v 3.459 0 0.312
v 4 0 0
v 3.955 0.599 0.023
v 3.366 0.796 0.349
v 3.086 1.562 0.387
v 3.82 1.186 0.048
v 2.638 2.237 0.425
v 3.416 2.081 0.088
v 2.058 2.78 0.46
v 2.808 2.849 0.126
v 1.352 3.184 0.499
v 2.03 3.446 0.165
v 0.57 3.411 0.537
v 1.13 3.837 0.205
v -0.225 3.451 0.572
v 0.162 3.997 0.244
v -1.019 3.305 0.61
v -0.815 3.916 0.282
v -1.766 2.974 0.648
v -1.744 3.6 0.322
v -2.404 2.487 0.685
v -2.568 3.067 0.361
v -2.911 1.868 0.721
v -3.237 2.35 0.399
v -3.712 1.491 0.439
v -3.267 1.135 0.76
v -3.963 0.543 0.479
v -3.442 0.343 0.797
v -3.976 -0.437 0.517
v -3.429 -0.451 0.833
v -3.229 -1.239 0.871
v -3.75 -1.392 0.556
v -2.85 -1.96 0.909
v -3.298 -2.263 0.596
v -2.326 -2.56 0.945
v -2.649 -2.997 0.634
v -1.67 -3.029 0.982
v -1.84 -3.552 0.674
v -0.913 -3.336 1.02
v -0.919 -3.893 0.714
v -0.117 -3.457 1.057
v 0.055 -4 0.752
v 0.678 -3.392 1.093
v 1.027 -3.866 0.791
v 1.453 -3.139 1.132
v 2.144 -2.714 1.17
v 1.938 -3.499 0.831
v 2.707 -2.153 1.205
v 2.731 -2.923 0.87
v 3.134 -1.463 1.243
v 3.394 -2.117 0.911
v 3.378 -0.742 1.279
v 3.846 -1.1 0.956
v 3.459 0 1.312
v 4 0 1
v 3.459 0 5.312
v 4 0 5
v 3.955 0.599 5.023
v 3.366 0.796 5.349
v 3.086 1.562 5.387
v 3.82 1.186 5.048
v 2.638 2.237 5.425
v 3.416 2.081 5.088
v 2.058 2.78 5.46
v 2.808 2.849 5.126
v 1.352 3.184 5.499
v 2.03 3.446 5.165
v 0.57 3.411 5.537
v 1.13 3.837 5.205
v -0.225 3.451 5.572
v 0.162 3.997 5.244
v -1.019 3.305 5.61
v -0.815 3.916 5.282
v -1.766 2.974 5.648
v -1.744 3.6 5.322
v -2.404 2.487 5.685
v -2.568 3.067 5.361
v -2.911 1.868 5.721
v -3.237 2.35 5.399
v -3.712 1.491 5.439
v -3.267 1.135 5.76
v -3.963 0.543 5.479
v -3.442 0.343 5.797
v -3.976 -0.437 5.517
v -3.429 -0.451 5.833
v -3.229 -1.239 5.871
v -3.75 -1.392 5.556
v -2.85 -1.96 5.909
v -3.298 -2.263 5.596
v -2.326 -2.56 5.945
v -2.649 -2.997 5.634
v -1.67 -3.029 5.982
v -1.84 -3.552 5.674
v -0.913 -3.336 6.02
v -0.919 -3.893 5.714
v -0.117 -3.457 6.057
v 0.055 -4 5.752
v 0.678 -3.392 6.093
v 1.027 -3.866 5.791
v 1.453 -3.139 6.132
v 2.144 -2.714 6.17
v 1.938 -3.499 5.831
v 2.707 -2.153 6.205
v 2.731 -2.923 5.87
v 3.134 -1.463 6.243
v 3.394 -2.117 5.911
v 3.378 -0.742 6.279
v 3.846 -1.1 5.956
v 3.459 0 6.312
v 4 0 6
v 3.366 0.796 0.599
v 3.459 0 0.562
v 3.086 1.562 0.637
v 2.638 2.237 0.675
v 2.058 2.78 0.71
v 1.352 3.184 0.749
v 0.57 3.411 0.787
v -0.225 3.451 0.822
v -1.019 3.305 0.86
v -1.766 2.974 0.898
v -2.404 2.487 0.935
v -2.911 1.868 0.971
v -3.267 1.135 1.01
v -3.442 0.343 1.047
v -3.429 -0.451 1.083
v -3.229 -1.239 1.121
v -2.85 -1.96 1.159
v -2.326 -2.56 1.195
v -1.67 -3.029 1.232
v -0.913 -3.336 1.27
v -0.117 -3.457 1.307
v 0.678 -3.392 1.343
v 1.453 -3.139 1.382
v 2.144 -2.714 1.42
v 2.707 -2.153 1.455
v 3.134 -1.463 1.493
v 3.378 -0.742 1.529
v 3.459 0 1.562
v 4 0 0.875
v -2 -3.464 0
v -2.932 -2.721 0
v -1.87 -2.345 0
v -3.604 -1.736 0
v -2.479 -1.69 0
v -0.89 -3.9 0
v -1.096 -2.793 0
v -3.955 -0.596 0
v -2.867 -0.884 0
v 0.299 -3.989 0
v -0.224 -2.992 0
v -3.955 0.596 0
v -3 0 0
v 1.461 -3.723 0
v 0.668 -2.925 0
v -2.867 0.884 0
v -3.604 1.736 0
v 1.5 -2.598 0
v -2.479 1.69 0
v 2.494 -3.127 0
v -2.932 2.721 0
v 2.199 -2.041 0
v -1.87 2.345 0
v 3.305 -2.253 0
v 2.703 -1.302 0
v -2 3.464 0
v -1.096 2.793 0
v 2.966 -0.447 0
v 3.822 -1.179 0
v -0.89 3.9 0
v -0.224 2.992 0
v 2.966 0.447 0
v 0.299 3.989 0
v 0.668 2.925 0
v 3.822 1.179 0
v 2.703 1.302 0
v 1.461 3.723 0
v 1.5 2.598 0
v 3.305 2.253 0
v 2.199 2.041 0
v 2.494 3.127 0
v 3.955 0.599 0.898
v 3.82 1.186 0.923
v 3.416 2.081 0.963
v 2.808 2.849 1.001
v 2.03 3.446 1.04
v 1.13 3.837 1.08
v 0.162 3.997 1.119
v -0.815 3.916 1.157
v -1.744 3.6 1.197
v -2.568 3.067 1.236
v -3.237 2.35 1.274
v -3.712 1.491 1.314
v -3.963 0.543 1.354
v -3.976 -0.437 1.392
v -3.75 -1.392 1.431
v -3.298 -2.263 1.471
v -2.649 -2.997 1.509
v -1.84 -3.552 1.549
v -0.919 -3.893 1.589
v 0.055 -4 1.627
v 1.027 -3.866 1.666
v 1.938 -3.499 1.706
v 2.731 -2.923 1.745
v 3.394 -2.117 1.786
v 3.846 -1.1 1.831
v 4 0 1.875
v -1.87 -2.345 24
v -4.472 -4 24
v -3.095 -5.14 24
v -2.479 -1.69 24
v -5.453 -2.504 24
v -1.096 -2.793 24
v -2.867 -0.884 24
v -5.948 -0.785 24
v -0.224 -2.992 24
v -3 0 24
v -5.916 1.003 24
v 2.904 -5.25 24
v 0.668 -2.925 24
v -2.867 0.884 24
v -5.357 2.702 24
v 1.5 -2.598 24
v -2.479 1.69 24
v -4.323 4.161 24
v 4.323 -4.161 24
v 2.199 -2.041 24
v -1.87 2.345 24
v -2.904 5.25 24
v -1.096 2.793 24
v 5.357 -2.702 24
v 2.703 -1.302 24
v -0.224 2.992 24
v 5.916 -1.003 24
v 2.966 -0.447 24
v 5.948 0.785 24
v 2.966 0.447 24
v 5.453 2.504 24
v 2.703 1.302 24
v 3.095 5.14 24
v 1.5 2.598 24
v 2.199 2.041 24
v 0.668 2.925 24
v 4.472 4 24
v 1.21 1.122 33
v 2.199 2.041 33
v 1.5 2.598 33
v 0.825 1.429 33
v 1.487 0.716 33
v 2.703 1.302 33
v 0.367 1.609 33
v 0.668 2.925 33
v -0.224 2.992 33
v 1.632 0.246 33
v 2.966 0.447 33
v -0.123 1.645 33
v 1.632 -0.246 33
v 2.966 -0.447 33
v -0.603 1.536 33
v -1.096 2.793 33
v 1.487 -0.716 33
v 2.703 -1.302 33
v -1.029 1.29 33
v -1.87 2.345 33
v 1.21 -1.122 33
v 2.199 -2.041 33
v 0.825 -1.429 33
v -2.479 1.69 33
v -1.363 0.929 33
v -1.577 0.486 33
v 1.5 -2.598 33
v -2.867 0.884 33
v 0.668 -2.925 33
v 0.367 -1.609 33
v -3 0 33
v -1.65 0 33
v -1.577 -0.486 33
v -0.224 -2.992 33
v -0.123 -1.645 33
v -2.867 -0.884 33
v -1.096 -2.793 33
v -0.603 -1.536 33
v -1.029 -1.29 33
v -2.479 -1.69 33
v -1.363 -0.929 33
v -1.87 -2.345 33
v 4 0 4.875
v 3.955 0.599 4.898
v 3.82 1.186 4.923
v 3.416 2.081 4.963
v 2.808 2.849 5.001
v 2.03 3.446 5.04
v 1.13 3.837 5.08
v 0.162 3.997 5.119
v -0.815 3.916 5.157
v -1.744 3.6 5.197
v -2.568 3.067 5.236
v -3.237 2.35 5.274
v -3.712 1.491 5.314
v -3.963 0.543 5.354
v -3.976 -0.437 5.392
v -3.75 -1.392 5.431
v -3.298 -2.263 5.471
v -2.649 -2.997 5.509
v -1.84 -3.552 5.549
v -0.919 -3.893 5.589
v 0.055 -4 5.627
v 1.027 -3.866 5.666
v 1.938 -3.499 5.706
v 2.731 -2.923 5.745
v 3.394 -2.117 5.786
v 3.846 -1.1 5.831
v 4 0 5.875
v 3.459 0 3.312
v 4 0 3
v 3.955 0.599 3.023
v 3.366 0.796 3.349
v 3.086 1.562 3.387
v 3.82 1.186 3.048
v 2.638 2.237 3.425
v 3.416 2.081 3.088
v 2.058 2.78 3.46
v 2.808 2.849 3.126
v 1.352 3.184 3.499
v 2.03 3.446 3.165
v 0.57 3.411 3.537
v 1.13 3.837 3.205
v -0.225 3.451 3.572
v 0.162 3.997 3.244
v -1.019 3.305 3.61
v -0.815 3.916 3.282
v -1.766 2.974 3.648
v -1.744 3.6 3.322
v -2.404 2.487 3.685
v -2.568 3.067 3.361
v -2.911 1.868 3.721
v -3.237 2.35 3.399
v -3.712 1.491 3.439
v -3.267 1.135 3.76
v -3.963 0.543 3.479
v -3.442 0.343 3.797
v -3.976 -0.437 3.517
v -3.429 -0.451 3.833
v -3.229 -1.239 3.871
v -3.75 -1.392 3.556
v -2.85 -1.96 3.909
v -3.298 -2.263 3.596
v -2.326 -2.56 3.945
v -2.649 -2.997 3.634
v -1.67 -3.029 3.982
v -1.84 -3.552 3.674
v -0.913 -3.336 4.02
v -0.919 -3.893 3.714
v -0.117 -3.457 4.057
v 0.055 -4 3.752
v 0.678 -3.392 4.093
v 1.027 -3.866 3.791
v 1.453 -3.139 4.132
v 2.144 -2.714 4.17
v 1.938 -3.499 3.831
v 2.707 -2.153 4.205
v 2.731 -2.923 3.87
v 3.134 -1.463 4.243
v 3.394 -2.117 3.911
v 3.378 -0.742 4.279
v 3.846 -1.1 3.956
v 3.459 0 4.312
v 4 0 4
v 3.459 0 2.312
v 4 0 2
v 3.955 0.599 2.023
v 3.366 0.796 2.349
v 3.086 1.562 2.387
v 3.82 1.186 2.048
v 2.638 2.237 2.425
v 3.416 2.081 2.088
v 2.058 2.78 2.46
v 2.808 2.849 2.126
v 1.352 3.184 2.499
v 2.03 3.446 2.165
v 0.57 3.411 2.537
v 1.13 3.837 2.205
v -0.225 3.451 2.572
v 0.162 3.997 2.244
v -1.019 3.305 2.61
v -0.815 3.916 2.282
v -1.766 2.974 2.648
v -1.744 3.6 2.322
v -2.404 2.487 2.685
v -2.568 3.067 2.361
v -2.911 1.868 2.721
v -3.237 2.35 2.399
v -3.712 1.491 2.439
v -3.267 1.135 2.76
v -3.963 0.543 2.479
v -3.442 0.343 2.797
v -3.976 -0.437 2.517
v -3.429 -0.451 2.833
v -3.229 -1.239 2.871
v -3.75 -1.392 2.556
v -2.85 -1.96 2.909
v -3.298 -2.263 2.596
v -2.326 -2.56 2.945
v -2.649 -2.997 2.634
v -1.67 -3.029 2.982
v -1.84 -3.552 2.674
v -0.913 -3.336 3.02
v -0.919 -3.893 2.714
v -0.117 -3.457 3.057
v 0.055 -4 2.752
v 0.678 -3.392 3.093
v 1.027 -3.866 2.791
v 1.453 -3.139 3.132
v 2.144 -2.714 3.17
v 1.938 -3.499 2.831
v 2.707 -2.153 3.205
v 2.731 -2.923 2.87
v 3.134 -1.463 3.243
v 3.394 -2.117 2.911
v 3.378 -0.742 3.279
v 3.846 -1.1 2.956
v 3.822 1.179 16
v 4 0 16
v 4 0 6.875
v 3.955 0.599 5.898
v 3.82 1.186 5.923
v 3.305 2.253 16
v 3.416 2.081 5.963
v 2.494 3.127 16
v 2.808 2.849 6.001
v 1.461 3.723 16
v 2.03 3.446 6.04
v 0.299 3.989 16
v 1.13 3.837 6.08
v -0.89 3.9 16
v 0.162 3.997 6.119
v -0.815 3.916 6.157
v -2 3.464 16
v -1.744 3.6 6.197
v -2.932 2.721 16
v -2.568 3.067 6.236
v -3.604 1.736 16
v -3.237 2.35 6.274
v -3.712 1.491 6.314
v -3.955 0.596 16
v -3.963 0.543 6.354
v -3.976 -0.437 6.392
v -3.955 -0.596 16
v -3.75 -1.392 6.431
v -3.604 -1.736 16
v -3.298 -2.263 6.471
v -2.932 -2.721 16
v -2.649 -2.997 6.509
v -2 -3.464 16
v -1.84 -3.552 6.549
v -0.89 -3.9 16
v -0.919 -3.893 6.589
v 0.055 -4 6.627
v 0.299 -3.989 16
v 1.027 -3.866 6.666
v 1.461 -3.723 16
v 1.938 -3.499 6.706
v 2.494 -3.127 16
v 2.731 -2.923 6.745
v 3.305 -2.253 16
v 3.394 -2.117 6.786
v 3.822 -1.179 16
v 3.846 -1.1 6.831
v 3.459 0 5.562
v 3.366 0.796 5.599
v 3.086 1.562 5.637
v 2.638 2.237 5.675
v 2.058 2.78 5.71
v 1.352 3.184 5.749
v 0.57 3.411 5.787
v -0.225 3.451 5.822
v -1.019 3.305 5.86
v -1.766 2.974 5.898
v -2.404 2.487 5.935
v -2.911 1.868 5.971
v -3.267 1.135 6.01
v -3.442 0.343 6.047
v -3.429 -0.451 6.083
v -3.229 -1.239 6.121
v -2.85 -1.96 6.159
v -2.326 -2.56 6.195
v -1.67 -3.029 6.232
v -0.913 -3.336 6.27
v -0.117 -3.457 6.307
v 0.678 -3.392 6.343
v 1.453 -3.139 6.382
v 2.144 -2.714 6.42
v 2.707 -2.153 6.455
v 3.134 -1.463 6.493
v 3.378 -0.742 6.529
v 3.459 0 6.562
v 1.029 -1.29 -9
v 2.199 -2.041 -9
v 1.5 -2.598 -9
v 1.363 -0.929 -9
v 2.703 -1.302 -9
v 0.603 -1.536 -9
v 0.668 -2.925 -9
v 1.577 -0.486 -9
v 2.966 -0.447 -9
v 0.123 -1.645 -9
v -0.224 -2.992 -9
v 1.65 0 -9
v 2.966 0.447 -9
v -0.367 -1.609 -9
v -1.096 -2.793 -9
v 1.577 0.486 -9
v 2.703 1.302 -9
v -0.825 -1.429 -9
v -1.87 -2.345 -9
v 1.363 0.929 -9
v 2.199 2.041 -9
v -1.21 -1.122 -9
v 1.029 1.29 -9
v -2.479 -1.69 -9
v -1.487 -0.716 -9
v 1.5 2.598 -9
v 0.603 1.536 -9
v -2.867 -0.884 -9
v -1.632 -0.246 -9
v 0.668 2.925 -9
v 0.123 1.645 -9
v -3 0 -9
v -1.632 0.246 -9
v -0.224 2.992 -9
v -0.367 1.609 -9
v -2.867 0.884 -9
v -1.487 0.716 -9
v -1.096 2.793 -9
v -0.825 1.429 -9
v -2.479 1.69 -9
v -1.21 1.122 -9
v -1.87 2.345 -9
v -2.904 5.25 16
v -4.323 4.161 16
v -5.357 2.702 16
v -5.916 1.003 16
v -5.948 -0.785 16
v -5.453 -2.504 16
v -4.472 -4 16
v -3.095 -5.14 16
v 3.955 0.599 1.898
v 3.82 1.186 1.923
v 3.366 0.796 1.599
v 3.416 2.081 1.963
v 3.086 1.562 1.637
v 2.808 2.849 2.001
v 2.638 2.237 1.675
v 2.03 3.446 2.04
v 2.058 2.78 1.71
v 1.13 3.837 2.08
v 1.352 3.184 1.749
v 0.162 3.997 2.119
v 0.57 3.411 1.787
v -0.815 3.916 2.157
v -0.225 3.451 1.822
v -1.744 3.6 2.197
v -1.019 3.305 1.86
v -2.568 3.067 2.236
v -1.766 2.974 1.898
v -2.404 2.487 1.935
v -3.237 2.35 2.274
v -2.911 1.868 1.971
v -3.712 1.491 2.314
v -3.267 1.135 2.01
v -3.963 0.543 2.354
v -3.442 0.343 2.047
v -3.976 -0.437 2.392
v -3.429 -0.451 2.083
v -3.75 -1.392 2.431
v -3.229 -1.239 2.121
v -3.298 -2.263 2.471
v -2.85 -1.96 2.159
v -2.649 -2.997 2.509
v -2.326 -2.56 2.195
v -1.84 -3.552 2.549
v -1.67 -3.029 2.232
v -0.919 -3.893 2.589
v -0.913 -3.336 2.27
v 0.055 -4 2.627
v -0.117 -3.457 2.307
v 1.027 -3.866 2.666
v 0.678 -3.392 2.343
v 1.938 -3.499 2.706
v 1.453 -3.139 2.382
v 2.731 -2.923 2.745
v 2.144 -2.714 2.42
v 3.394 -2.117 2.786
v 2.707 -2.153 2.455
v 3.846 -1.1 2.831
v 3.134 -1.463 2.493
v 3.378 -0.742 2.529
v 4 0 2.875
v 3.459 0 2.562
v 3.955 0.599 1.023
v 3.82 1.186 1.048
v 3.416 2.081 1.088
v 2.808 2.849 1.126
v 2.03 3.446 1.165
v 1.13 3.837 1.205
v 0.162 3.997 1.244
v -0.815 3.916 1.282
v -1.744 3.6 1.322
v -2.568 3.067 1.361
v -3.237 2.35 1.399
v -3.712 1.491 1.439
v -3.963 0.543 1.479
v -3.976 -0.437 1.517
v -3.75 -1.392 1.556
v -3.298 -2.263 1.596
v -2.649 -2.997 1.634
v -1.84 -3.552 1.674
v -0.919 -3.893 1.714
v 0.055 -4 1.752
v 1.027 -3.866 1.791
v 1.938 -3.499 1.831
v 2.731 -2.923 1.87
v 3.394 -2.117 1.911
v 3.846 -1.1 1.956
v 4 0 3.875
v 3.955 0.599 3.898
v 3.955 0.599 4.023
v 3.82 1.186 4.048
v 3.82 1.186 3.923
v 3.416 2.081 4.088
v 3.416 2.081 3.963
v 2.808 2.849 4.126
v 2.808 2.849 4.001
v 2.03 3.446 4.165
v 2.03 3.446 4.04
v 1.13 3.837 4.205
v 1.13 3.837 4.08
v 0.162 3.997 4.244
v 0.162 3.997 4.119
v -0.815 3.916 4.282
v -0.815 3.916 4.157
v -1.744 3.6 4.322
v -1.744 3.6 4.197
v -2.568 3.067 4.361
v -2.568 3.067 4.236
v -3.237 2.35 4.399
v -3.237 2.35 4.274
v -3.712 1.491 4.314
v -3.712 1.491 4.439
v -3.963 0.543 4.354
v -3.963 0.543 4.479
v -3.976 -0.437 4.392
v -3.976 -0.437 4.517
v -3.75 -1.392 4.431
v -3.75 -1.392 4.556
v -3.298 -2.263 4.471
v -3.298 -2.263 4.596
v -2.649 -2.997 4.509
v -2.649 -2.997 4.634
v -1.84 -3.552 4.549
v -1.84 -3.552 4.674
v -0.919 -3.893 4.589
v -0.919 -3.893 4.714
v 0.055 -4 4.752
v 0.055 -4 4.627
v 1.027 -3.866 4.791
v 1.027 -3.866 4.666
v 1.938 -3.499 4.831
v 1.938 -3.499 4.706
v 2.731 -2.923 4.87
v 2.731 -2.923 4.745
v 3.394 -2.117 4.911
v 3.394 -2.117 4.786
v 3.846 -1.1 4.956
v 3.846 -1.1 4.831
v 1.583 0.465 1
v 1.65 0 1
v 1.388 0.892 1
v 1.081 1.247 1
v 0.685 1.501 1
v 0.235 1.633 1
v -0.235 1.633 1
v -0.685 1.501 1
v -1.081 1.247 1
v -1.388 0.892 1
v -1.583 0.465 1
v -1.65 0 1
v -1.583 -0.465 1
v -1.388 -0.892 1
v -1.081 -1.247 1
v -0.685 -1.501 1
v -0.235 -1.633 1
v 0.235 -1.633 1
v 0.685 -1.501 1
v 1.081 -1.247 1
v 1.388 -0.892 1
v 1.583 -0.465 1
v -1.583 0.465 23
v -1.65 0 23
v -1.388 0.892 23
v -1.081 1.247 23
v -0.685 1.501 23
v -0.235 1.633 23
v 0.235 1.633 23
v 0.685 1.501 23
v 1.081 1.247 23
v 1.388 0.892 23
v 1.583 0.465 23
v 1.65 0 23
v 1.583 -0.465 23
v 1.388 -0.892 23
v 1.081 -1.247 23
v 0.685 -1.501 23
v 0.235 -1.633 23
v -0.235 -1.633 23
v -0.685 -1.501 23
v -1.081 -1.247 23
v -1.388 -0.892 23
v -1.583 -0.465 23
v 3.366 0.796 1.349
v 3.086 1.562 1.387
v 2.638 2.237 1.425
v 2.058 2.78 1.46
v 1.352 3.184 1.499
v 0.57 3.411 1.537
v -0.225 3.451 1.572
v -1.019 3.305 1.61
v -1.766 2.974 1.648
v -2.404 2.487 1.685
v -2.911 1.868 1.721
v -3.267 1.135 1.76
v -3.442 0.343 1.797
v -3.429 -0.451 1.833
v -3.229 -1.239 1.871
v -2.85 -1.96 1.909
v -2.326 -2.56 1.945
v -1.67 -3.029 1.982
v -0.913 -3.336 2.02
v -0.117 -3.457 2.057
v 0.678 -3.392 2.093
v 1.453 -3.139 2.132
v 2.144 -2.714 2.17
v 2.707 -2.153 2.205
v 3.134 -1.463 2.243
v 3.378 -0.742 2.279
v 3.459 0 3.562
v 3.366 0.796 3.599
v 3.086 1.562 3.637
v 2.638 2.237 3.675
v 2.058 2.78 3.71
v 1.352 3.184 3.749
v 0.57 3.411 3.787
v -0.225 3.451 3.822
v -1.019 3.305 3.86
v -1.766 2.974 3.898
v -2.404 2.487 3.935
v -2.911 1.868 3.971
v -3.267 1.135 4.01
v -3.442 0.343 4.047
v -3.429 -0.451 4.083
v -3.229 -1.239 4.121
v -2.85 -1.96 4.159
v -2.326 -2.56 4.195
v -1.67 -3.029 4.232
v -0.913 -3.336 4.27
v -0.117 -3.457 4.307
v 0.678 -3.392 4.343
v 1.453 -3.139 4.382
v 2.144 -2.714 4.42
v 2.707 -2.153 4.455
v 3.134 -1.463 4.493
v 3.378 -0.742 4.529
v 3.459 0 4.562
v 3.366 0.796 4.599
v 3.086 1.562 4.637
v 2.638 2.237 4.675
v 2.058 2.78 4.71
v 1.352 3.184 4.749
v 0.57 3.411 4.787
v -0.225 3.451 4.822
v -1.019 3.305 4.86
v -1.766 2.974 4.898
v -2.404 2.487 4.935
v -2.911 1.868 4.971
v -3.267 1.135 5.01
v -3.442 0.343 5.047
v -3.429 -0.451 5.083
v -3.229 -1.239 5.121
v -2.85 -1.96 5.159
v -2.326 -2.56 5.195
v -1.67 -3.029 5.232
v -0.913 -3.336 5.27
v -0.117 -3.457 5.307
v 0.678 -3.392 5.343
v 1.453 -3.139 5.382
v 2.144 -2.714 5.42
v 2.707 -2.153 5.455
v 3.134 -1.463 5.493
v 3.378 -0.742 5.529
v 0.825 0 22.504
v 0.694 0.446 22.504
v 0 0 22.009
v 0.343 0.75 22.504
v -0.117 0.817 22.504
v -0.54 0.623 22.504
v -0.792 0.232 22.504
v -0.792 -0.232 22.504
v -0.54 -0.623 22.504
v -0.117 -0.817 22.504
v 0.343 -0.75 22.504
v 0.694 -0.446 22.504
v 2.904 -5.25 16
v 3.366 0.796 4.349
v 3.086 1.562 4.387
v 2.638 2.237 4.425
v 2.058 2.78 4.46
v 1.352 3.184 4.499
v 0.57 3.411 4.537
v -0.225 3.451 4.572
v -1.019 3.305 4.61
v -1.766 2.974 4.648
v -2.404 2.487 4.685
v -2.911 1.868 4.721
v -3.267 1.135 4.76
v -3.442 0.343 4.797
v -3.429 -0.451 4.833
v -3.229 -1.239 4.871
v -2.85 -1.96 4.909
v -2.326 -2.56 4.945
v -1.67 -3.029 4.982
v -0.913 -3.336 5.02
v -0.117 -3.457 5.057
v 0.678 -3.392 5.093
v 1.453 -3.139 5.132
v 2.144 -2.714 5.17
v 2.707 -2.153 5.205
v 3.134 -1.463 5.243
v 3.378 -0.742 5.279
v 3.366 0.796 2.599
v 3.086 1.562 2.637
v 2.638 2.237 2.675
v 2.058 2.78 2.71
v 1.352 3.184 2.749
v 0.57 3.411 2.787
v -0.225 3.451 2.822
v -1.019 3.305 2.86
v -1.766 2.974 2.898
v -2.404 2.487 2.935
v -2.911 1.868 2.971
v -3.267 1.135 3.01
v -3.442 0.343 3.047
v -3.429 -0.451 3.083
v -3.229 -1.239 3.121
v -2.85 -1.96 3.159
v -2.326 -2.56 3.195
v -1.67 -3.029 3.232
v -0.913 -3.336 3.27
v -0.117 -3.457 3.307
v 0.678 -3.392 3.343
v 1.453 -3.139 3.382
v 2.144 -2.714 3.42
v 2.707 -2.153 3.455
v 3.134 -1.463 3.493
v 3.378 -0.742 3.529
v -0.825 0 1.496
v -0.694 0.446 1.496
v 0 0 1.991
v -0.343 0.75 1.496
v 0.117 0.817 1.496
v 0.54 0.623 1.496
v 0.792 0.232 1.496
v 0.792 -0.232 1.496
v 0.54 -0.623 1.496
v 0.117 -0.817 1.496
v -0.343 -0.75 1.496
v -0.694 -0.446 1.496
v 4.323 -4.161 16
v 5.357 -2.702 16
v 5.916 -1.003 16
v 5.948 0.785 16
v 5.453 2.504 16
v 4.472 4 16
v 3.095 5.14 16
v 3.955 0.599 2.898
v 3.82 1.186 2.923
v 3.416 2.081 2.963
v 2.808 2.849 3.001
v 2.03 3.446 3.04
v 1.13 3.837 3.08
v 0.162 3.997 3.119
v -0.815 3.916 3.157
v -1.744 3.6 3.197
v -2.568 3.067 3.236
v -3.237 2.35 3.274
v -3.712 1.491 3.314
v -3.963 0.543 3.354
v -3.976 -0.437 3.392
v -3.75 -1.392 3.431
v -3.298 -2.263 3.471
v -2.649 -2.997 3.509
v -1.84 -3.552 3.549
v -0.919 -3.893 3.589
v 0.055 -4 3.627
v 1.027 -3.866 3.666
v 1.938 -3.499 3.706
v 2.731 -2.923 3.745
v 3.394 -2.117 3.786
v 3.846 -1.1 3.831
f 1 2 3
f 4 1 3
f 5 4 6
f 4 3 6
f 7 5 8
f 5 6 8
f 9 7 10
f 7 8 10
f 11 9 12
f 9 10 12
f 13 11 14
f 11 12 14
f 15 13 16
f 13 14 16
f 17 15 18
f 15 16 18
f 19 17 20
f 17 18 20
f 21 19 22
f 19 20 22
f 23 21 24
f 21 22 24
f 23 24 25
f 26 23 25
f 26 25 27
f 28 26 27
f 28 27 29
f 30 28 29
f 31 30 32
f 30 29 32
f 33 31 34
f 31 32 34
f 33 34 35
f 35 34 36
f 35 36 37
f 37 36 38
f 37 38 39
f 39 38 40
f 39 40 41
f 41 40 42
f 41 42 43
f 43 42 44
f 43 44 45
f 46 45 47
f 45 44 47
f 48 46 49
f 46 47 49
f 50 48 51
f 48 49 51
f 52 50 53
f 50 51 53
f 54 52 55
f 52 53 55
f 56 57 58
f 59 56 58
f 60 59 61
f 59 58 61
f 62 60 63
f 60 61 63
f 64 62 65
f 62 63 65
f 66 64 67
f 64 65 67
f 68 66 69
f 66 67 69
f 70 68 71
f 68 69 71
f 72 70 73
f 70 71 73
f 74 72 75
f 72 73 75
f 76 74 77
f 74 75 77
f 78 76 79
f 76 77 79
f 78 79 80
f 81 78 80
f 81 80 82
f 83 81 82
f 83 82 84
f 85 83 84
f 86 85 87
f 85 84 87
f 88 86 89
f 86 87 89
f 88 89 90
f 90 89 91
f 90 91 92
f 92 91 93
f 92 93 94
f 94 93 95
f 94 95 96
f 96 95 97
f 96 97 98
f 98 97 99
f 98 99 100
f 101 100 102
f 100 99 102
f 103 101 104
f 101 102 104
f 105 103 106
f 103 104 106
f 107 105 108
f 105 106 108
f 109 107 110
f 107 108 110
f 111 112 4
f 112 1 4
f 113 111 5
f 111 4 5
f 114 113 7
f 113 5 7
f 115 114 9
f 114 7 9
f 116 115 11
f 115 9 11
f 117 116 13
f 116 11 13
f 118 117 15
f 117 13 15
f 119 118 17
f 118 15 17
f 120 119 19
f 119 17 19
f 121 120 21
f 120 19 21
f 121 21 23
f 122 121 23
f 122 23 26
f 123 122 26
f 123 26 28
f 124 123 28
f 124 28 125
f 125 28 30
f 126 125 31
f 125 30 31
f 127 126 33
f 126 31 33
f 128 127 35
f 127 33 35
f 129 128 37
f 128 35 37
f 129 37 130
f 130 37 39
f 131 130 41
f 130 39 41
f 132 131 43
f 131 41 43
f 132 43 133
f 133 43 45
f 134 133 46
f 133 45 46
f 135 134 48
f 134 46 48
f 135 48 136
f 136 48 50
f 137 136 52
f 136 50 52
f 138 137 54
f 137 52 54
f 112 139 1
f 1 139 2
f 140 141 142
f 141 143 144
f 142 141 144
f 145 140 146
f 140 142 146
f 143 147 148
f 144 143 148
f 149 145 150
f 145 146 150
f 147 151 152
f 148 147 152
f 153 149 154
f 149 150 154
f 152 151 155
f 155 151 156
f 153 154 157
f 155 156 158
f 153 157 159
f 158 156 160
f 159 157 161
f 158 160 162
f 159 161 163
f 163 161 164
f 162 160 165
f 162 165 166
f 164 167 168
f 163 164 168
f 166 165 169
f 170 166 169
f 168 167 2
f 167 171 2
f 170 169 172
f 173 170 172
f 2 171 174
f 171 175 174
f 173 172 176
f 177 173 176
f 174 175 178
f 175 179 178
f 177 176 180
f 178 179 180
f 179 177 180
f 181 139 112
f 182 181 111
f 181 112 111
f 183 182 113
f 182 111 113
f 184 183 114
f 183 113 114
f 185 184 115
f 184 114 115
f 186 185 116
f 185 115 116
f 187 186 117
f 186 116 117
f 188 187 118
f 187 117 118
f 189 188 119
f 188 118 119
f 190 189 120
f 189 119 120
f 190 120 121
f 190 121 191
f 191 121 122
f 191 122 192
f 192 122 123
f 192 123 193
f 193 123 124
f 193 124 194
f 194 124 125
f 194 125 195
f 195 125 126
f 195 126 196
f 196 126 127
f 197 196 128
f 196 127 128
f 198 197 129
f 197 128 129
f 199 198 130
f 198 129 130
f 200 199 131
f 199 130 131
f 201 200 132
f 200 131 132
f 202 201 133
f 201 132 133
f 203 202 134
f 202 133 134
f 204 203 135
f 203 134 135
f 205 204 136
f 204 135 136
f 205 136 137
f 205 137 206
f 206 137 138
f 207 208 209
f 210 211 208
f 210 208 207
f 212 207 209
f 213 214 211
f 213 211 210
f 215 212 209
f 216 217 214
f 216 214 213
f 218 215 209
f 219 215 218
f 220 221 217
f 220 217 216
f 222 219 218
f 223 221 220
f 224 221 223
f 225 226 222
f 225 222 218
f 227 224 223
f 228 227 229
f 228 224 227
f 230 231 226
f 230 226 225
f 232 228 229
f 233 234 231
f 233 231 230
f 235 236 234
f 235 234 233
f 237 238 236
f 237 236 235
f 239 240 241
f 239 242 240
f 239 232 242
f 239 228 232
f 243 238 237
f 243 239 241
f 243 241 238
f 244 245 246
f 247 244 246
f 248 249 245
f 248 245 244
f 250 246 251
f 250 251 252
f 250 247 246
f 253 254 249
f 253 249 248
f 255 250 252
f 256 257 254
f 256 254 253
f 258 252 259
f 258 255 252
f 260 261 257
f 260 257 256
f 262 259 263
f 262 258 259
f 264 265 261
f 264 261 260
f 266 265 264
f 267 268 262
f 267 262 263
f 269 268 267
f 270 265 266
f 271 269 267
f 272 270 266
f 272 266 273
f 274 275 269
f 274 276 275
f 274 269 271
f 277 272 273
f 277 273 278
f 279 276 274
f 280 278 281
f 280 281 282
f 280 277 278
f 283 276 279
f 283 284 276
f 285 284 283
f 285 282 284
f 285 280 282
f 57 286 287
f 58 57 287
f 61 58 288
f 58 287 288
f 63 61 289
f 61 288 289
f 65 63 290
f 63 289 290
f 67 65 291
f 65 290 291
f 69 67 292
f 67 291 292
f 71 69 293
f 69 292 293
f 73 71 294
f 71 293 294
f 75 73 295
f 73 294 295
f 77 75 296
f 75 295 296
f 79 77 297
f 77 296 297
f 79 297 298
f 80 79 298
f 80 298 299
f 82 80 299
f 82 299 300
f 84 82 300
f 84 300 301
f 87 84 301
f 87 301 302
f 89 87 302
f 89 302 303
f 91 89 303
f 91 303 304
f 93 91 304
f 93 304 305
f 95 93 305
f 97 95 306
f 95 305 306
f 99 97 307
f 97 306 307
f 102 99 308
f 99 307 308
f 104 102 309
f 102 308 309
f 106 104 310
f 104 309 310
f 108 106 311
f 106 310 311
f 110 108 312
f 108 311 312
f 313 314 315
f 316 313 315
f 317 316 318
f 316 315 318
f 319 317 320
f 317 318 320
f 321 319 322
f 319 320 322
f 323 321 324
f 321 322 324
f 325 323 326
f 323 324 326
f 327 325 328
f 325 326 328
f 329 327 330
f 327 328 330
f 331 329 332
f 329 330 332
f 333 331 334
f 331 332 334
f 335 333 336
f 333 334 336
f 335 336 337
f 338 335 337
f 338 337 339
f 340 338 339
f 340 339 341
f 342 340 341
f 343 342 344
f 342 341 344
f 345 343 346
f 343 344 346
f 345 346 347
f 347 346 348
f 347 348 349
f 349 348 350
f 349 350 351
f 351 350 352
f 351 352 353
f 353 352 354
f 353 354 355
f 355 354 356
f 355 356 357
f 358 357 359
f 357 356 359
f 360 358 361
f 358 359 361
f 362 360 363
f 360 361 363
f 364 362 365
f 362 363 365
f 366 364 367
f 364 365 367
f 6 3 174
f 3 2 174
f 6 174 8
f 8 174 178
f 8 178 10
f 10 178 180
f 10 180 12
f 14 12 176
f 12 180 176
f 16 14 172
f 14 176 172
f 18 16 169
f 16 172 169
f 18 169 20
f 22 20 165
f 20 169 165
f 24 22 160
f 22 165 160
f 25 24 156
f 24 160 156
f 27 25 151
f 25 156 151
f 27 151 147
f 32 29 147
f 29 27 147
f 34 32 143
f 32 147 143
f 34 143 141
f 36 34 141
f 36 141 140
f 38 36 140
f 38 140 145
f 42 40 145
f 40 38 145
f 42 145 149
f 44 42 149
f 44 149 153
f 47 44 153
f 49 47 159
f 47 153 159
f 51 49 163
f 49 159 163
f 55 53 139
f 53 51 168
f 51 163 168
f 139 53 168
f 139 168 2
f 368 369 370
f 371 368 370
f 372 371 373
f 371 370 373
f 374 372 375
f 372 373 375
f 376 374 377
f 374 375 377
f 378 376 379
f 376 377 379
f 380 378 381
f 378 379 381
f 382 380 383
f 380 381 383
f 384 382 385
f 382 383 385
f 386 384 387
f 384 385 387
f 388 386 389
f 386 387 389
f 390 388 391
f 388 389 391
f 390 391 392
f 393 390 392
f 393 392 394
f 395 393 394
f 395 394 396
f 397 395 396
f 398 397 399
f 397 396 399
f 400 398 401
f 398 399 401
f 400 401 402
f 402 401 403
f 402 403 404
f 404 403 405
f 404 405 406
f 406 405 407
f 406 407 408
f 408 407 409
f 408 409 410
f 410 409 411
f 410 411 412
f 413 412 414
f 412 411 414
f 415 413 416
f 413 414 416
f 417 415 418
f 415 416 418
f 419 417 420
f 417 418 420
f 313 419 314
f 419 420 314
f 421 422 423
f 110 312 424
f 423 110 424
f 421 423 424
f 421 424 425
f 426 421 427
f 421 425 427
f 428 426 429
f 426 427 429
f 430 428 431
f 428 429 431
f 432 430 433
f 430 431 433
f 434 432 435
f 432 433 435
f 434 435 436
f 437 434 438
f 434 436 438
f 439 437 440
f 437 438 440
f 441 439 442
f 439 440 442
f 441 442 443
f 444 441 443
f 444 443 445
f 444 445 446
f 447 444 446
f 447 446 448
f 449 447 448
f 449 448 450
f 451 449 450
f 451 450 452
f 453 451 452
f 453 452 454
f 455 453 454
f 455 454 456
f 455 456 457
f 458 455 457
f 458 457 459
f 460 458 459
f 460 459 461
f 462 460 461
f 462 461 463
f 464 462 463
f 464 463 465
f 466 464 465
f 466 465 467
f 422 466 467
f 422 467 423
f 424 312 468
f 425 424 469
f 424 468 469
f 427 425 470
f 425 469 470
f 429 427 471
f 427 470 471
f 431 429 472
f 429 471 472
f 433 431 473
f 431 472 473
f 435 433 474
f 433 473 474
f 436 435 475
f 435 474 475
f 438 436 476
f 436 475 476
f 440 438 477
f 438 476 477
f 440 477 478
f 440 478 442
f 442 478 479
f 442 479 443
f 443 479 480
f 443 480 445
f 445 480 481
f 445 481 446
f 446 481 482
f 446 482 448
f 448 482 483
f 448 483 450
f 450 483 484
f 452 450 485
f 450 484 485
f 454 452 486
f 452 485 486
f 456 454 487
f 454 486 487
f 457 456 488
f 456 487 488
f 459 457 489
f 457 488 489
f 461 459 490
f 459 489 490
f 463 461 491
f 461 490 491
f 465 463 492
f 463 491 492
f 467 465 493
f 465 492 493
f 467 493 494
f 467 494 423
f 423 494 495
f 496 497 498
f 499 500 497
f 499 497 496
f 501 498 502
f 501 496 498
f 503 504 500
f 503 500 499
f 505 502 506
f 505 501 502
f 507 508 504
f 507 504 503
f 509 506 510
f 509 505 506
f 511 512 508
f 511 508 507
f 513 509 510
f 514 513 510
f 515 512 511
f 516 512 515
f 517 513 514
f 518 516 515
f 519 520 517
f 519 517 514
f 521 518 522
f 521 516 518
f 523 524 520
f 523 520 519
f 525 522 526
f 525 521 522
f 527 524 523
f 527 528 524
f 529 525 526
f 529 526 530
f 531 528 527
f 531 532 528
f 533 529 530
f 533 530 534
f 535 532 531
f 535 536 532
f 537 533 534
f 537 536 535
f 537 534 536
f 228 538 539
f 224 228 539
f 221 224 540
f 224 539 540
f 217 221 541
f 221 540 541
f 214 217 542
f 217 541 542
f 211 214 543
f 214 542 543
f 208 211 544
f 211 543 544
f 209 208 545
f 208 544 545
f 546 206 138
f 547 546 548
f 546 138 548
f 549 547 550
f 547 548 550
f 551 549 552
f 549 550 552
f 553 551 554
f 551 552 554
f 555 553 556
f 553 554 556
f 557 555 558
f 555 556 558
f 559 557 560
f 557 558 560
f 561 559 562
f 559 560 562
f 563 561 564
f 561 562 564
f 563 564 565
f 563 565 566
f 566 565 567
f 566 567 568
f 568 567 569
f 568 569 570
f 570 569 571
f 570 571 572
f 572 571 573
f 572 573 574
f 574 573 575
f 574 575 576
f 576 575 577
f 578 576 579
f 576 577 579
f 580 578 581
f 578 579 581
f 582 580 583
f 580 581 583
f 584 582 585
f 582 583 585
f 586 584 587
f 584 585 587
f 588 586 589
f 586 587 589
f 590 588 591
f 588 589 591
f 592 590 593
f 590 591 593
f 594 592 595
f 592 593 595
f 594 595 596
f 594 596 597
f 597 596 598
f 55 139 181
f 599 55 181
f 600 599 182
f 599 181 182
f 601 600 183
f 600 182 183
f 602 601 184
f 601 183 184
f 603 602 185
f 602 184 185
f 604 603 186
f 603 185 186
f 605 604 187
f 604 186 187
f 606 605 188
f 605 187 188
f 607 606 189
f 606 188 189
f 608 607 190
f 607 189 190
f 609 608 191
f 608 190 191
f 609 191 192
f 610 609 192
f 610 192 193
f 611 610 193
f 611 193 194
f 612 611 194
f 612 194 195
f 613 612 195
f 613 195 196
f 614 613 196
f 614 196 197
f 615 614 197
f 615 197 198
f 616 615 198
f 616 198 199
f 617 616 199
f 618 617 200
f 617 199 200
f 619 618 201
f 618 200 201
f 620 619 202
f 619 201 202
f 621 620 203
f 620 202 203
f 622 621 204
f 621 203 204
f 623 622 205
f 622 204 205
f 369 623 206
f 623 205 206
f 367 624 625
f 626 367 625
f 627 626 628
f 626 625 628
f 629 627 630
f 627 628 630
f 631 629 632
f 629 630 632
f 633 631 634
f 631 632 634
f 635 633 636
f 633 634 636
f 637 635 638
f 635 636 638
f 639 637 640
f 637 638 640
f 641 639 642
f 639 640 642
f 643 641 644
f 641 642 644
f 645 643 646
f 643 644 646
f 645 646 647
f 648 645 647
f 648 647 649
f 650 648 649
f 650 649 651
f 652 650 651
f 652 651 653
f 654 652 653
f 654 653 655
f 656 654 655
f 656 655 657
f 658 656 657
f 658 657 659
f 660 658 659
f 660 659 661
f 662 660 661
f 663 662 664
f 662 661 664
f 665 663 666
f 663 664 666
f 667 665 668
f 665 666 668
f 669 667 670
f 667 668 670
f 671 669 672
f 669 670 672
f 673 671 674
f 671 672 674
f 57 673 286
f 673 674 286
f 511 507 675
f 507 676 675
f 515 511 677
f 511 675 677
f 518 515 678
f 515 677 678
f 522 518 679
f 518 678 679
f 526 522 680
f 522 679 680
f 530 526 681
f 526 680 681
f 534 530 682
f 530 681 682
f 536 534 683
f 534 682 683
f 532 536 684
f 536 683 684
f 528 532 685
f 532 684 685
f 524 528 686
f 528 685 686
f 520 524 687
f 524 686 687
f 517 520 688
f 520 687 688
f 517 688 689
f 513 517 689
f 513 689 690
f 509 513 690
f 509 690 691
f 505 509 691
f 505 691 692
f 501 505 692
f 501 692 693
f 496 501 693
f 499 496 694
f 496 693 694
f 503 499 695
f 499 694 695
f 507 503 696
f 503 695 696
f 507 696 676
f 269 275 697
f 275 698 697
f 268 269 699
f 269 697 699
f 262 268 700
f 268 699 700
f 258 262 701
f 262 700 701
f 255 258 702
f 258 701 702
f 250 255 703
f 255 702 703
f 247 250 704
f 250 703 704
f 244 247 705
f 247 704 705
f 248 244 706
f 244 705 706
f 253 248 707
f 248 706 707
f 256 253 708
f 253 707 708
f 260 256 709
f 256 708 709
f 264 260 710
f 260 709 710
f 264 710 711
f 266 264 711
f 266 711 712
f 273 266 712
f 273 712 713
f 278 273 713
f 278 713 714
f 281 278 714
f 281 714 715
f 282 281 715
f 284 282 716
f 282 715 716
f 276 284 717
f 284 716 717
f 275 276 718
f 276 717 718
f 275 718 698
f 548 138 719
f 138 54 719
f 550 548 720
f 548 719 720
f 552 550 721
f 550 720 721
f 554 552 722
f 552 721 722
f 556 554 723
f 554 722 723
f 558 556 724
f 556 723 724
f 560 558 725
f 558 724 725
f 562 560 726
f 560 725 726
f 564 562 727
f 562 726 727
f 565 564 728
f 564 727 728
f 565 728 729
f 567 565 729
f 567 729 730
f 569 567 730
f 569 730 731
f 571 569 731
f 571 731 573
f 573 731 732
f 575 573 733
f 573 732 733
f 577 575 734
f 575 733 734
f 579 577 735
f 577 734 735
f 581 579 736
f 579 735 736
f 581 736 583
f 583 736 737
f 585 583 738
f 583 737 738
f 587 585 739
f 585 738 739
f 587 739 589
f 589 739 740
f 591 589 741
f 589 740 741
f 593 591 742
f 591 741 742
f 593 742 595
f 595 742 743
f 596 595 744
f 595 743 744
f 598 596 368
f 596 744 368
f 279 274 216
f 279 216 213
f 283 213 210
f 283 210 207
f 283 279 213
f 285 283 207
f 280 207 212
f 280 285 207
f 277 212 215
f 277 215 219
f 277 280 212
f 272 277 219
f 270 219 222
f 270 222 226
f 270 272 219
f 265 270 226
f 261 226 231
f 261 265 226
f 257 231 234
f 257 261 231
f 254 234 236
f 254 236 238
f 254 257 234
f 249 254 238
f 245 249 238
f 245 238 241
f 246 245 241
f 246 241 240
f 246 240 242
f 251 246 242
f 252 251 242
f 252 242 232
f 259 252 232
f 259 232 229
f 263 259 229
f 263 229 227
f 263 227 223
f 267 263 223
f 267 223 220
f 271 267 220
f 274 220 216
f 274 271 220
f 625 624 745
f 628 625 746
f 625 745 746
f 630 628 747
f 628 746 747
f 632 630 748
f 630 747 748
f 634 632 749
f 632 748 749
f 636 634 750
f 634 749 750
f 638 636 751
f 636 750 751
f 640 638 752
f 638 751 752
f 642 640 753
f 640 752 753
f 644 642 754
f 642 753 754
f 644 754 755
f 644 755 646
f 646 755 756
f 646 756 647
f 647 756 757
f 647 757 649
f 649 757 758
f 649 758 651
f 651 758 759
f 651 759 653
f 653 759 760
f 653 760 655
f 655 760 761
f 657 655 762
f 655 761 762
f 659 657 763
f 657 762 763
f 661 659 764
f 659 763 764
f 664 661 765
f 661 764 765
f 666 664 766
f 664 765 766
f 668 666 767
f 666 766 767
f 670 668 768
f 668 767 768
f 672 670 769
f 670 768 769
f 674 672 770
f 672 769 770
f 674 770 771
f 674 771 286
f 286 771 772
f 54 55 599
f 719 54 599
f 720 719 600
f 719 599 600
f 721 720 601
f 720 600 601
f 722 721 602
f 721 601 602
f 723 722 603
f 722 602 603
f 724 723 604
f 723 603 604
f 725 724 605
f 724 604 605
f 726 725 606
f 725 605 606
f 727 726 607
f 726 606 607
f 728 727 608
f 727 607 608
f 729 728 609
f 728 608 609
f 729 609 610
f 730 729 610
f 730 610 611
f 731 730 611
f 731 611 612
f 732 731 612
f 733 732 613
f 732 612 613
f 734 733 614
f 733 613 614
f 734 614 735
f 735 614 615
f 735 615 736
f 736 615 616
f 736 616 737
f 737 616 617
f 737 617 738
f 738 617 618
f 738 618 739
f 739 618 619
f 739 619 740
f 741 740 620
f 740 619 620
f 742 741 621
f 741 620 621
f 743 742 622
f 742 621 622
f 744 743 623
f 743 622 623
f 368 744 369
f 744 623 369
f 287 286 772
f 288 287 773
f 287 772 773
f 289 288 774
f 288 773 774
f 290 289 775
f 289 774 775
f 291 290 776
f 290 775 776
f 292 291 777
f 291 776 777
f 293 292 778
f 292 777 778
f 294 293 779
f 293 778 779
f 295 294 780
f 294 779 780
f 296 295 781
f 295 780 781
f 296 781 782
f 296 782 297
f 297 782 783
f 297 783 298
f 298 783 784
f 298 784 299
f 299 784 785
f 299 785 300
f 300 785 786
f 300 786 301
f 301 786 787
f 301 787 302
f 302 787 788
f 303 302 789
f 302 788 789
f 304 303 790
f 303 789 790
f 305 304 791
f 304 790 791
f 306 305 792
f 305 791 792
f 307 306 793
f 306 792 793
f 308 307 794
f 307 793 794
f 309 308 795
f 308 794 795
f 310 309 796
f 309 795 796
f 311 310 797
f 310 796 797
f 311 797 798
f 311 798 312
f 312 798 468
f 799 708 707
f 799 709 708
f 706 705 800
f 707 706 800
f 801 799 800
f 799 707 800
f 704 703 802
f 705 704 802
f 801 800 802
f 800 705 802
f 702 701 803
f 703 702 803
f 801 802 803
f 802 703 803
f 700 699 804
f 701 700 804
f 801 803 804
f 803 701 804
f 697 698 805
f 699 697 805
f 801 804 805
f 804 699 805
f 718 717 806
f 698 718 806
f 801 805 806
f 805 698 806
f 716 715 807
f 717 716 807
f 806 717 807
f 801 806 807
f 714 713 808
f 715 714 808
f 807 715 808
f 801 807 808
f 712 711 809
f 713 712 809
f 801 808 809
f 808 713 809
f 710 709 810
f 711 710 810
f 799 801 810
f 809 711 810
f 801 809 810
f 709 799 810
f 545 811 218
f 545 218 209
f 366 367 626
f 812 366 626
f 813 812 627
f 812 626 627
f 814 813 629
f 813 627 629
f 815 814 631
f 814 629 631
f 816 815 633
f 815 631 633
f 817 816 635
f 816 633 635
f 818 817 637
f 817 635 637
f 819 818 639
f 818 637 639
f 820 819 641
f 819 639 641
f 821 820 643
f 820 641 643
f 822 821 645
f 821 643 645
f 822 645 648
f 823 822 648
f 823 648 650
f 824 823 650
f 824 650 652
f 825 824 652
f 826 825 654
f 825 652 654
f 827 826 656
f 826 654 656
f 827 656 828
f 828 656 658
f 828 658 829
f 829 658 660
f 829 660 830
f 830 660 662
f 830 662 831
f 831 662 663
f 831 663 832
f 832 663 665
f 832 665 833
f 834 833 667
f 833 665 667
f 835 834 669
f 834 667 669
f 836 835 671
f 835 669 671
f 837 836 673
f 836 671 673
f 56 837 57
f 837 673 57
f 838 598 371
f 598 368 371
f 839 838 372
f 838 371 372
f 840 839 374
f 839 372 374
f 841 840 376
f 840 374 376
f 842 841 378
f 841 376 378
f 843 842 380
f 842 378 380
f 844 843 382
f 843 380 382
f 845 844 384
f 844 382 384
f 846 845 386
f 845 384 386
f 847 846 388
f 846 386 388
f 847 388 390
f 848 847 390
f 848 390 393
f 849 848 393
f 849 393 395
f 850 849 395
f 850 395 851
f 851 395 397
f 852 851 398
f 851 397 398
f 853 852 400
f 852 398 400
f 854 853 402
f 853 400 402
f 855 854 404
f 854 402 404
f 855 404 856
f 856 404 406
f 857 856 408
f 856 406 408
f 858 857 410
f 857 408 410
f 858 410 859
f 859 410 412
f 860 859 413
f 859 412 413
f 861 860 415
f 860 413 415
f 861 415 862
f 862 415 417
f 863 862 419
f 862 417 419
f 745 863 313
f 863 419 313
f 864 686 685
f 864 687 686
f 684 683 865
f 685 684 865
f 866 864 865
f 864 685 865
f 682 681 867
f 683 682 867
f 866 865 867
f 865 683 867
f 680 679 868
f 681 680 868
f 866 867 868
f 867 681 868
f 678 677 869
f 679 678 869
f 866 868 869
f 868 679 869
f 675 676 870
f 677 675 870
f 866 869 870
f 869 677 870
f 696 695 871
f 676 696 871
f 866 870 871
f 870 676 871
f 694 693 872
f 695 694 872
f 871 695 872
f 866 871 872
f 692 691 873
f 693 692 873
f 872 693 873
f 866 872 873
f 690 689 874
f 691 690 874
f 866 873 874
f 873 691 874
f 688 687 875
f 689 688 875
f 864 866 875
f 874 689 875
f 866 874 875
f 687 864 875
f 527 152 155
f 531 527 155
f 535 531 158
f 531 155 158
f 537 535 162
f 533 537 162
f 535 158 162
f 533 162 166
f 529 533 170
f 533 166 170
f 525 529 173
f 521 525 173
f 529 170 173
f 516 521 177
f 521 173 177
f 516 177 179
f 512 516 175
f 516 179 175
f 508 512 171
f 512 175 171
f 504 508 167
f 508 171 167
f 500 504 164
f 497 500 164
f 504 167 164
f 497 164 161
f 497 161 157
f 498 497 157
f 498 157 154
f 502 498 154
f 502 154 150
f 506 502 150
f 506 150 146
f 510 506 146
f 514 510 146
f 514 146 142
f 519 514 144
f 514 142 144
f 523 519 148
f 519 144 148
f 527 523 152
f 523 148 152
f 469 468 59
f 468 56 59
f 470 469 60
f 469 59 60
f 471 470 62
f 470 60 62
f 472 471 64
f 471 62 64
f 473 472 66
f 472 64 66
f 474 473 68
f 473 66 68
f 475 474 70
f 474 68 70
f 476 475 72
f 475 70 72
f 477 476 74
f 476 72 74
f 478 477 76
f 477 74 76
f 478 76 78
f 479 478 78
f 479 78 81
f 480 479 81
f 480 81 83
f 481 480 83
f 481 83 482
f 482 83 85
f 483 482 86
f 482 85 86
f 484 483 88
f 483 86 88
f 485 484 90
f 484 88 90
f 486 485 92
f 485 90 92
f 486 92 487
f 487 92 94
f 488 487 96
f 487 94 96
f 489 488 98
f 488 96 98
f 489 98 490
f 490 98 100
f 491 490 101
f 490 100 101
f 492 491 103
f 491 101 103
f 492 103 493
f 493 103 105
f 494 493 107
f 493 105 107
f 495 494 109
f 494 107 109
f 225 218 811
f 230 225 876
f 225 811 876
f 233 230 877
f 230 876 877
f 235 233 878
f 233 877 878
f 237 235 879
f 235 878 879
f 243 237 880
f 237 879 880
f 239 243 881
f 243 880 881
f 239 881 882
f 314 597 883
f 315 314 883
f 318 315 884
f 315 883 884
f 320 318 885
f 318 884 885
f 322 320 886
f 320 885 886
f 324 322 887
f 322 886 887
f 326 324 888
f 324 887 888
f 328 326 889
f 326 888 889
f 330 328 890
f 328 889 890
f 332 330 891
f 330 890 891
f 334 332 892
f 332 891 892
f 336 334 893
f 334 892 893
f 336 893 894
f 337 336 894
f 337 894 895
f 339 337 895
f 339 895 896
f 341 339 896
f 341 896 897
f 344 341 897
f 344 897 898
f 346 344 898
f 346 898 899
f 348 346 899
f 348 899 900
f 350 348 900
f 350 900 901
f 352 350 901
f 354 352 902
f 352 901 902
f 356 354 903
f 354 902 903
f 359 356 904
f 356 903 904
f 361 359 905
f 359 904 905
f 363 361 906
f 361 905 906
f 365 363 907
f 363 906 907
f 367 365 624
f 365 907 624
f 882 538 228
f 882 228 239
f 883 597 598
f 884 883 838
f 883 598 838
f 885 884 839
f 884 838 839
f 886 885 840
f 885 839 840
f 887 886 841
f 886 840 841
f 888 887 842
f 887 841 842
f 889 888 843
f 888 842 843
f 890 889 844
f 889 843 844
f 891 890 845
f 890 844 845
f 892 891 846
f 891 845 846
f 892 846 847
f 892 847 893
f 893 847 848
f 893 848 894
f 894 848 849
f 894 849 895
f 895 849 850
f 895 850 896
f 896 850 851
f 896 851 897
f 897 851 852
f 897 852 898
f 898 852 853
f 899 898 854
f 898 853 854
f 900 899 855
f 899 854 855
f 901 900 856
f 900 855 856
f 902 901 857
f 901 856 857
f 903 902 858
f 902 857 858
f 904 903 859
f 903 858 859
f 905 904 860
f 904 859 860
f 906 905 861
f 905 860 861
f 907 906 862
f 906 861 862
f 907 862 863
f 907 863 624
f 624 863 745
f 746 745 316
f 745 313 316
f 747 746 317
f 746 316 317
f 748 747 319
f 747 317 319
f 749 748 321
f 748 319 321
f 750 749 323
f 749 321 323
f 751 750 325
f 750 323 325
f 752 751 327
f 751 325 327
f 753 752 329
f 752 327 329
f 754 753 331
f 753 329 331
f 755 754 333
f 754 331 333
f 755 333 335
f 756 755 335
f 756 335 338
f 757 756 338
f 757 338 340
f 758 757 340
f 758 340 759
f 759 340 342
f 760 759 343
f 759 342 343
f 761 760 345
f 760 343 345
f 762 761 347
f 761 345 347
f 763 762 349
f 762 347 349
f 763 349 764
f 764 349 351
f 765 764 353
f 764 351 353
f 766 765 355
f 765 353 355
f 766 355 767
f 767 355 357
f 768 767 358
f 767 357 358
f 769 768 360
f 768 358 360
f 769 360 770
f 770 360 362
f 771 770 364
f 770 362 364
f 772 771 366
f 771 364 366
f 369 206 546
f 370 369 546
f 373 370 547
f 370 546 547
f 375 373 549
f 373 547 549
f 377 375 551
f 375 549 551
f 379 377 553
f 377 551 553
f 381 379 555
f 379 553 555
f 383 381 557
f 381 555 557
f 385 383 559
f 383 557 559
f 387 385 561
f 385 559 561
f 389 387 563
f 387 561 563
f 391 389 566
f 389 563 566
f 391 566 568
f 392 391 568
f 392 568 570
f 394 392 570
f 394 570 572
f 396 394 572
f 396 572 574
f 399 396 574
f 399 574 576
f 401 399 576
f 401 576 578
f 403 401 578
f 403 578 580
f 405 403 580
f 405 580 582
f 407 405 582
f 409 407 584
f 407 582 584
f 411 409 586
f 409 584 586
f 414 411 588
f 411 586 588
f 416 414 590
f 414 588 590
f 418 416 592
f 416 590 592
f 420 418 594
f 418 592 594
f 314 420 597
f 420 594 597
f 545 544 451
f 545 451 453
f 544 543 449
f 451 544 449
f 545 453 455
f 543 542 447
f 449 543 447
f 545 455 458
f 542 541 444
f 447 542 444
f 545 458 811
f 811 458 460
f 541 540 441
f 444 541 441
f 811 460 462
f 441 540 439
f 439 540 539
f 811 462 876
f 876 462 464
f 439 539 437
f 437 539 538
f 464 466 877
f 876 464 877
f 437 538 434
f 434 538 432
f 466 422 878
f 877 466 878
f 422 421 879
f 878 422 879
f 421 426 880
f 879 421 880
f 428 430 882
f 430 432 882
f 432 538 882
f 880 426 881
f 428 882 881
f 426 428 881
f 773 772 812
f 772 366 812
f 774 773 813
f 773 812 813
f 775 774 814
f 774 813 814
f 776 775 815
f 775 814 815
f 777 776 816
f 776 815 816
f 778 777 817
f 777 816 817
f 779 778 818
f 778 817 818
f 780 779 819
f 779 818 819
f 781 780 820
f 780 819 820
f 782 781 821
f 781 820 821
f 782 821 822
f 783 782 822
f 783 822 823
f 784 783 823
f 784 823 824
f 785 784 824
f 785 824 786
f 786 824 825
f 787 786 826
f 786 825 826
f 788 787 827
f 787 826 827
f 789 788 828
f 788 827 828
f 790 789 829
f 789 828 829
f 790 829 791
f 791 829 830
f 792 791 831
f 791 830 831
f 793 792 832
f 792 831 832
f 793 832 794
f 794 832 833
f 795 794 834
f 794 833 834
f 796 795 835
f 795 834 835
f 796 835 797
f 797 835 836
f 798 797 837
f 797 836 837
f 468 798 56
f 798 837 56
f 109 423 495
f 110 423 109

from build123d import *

# Parameters (mm, degrees)
SKETCH1_R                 = 4
BOSS_EXTRUDE1_DEPTH       = 16
SKETCH2_R                 = 6
BOSS_EXTRUDE2_DEPTH       = 8
SKETCH3_R                 = 3
BOSS_EXTRUDE3_DEPTH       = 9
BOSS_EXTRUDE4_START       = 9
SKETCH8_R                 = 3
BOSS_EXTRUDE4_DEPTH       = 9
M4X0_7_TAPPED_HOLE2_D     = 3.3
M4X0_7_TAPPED_HOLE2_DEPTH = 10
M4X0_7_TAPPED_HOLE2_TIP   = 0.991420021
THREAD1_PITCH             = 1
M4X0_7_TAPPED_HOLE3_D     = 3.3
M4X0_7_TAPPED_HOLE3_DEPTH = 10
M4X0_7_TAPPED_HOLE3_TIP   = 0.991420021
CUT_EXTRUDE1_START        = -10
CUT_EXTRUDE1_DEPTH        = 10


with BuildPart() as part:
    # Sketch1 → Boss-Extrude1 (new body)
    with BuildSketch(Plane.XY):
        Circle(SKETCH1_R)
    extrude(amount=BOSS_EXTRUDE1_DEPTH)

    # Sketch2 → Boss-Extrude2 (add)
    with BuildSketch(Plane.XY.offset(16)):
        Circle(SKETCH2_R)
    extrude(amount=BOSS_EXTRUDE2_DEPTH)

    # Sketch3 → Boss-Extrude3 (add)
    with BuildSketch(Plane(origin=(0, 0, 0), x_dir=(-1, 0, 0), z_dir=(0, 0, -1))):
        Circle(SKETCH3_R)
    extrude(amount=BOSS_EXTRUDE3_DEPTH)

    # Sketch8 → Boss-Extrude4 (add)
    with BuildSketch(Plane.XY.offset(24).offset(BOSS_EXTRUDE4_START)):
        with Locations(Location((0, 0, 0), (0, 0, 180))):
            Circle(SKETCH8_R)
    extrude(amount=-BOSS_EXTRUDE4_DEPTH)

    # M4x0.7 Tapped Hole2
    with Locations(Plane.XY.offset(33)):
        with Locations((0, 0)):
            Hole(M4X0_7_TAPPED_HOLE2_D / 2, depth=M4X0_7_TAPPED_HOLE2_DEPTH)
            with Locations((0, 0, -(M4X0_7_TAPPED_HOLE2_DEPTH + M4X0_7_TAPPED_HOLE2_TIP / 2))):  # 118° drill point
                Cone(0, M4X0_7_TAPPED_HOLE2_D / 2, M4X0_7_TAPPED_HOLE2_TIP, mode=Mode.SUBTRACT)

    # Thread1: the profile of Thread Profile2 profile screwed along a right-hand helix of 6 turns, 8 arcs to a turn; built about Z, then put on its axis
    thread1_z = Axis((0, 0, 0), (0, 0, 1))
    thread1_corners = [(4.0003, 0, -0.000173205), (4.0003, 0, 0.875173202), (3.458734125, 0, 0.562499999), (3.458734125, 0, 0.312499999)]
    with BuildLine(mode=Mode.PRIVATE) as thread1_profile:
        Line(thread1_corners[0], thread1_corners[1])
        Line(thread1_corners[1], thread1_corners[2])
        Line(thread1_corners[2], thread1_corners[3])
        Line(thread1_corners[3], thread1_corners[0])
    thread1_cap = Face(thread1_profile.wire())
    thread1_turn_angles = [0, 22.5, 45, 67.5, 90, 112.5, 135, 157.5, 180, 202.5, 225, 247.5, 270, 292.5, 315, 337.5, 360]
    thread1_turn_weights = [1, 0.9238795325112867, 1, 0.9238795325112867, 1, 0.9238795325112867, 1, 0.9238795325112867, 1, 0.9238795325112867, 1, 0.9238795325112867, 1, 0.9238795325112867, 1, 0.9238795325112867, 1]
    thread1_turn_rails = [Edge.make_bspline([Vector(p[0], p[1], 0).rotate(thread1_z, thread1_turn_angles[k]) / thread1_turn_weights[k] + Vector(0, 0, p[2] + THREAD1_PITCH * thread1_turn_angles[k] / 360) for k in range(17)], [0, 0, 0, 1, 1, 2, 2, 3, 3, 4, 4, 5, 5, 6, 6, 7, 7, 8, 8, 8], 2, thread1_turn_weights) for p in thread1_corners]
    thread1_turn_sides = [Face.make_surface_from_curves(thread1_turn_rails[p[0]], thread1_turn_rails[p[1]]) for p in [(0, 1), (1, 2), (2, 3), (3, 0)]]
    thread1 = Plane(origin=(0, 0, 0), x_dir=(1, 0, 0), z_dir=(0, 0, 1)) * Solid(Shell([*[p.moved(Location((0, 0, THREAD1_PITCH * i))) for i in range(6) for p in thread1_turn_sides], thread1_cap, thread1_cap.rotate(thread1_z, 2160).moved(Location((0, 0, THREAD1_PITCH * 2160 / 360)))]))
    add(thread1, mode=Mode.SUBTRACT)

    # M4x0.7 Tapped Hole3
    with Locations(Plane(origin=(0, 0, -9), x_dir=(-1, 0, 0), z_dir=(0, 0, -1))):
        with Locations((0, 0)):
            Hole(M4X0_7_TAPPED_HOLE3_D / 2, depth=M4X0_7_TAPPED_HOLE3_DEPTH)
            with Locations((0, 0, -(M4X0_7_TAPPED_HOLE3_DEPTH + M4X0_7_TAPPED_HOLE3_TIP / 2))):  # 118° drill point
                Cone(0, M4X0_7_TAPPED_HOLE3_D / 2, M4X0_7_TAPPED_HOLE3_TIP, mode=Mode.SUBTRACT)

    # Sketch36 → Cut-Extrude1 (cut)
    with BuildSketch(Plane.XY.offset(24).offset(CUT_EXTRUDE1_START)):
        with BuildLine():
            Line((-2.90430853, 5.250237325), (3.094684634, 5.140323629))
            ThreePointArc((3.094684634, 5.140323629), (0.109913695, 5.998993164), (-2.90430853, 5.250237325))
        make_face()
        with BuildLine():
            ThreePointArc((-3.094684634, -5.140323629), (-0.109913695, -5.998993164), (2.90430853, -5.250237325))
            Line((2.90430853, -5.250237325), (-3.094684634, -5.140323629))
        make_face()
    extrude(amount=CUT_EXTRUDE1_DEPTH, mode=Mode.SUBTRACT)


solid = part.part
